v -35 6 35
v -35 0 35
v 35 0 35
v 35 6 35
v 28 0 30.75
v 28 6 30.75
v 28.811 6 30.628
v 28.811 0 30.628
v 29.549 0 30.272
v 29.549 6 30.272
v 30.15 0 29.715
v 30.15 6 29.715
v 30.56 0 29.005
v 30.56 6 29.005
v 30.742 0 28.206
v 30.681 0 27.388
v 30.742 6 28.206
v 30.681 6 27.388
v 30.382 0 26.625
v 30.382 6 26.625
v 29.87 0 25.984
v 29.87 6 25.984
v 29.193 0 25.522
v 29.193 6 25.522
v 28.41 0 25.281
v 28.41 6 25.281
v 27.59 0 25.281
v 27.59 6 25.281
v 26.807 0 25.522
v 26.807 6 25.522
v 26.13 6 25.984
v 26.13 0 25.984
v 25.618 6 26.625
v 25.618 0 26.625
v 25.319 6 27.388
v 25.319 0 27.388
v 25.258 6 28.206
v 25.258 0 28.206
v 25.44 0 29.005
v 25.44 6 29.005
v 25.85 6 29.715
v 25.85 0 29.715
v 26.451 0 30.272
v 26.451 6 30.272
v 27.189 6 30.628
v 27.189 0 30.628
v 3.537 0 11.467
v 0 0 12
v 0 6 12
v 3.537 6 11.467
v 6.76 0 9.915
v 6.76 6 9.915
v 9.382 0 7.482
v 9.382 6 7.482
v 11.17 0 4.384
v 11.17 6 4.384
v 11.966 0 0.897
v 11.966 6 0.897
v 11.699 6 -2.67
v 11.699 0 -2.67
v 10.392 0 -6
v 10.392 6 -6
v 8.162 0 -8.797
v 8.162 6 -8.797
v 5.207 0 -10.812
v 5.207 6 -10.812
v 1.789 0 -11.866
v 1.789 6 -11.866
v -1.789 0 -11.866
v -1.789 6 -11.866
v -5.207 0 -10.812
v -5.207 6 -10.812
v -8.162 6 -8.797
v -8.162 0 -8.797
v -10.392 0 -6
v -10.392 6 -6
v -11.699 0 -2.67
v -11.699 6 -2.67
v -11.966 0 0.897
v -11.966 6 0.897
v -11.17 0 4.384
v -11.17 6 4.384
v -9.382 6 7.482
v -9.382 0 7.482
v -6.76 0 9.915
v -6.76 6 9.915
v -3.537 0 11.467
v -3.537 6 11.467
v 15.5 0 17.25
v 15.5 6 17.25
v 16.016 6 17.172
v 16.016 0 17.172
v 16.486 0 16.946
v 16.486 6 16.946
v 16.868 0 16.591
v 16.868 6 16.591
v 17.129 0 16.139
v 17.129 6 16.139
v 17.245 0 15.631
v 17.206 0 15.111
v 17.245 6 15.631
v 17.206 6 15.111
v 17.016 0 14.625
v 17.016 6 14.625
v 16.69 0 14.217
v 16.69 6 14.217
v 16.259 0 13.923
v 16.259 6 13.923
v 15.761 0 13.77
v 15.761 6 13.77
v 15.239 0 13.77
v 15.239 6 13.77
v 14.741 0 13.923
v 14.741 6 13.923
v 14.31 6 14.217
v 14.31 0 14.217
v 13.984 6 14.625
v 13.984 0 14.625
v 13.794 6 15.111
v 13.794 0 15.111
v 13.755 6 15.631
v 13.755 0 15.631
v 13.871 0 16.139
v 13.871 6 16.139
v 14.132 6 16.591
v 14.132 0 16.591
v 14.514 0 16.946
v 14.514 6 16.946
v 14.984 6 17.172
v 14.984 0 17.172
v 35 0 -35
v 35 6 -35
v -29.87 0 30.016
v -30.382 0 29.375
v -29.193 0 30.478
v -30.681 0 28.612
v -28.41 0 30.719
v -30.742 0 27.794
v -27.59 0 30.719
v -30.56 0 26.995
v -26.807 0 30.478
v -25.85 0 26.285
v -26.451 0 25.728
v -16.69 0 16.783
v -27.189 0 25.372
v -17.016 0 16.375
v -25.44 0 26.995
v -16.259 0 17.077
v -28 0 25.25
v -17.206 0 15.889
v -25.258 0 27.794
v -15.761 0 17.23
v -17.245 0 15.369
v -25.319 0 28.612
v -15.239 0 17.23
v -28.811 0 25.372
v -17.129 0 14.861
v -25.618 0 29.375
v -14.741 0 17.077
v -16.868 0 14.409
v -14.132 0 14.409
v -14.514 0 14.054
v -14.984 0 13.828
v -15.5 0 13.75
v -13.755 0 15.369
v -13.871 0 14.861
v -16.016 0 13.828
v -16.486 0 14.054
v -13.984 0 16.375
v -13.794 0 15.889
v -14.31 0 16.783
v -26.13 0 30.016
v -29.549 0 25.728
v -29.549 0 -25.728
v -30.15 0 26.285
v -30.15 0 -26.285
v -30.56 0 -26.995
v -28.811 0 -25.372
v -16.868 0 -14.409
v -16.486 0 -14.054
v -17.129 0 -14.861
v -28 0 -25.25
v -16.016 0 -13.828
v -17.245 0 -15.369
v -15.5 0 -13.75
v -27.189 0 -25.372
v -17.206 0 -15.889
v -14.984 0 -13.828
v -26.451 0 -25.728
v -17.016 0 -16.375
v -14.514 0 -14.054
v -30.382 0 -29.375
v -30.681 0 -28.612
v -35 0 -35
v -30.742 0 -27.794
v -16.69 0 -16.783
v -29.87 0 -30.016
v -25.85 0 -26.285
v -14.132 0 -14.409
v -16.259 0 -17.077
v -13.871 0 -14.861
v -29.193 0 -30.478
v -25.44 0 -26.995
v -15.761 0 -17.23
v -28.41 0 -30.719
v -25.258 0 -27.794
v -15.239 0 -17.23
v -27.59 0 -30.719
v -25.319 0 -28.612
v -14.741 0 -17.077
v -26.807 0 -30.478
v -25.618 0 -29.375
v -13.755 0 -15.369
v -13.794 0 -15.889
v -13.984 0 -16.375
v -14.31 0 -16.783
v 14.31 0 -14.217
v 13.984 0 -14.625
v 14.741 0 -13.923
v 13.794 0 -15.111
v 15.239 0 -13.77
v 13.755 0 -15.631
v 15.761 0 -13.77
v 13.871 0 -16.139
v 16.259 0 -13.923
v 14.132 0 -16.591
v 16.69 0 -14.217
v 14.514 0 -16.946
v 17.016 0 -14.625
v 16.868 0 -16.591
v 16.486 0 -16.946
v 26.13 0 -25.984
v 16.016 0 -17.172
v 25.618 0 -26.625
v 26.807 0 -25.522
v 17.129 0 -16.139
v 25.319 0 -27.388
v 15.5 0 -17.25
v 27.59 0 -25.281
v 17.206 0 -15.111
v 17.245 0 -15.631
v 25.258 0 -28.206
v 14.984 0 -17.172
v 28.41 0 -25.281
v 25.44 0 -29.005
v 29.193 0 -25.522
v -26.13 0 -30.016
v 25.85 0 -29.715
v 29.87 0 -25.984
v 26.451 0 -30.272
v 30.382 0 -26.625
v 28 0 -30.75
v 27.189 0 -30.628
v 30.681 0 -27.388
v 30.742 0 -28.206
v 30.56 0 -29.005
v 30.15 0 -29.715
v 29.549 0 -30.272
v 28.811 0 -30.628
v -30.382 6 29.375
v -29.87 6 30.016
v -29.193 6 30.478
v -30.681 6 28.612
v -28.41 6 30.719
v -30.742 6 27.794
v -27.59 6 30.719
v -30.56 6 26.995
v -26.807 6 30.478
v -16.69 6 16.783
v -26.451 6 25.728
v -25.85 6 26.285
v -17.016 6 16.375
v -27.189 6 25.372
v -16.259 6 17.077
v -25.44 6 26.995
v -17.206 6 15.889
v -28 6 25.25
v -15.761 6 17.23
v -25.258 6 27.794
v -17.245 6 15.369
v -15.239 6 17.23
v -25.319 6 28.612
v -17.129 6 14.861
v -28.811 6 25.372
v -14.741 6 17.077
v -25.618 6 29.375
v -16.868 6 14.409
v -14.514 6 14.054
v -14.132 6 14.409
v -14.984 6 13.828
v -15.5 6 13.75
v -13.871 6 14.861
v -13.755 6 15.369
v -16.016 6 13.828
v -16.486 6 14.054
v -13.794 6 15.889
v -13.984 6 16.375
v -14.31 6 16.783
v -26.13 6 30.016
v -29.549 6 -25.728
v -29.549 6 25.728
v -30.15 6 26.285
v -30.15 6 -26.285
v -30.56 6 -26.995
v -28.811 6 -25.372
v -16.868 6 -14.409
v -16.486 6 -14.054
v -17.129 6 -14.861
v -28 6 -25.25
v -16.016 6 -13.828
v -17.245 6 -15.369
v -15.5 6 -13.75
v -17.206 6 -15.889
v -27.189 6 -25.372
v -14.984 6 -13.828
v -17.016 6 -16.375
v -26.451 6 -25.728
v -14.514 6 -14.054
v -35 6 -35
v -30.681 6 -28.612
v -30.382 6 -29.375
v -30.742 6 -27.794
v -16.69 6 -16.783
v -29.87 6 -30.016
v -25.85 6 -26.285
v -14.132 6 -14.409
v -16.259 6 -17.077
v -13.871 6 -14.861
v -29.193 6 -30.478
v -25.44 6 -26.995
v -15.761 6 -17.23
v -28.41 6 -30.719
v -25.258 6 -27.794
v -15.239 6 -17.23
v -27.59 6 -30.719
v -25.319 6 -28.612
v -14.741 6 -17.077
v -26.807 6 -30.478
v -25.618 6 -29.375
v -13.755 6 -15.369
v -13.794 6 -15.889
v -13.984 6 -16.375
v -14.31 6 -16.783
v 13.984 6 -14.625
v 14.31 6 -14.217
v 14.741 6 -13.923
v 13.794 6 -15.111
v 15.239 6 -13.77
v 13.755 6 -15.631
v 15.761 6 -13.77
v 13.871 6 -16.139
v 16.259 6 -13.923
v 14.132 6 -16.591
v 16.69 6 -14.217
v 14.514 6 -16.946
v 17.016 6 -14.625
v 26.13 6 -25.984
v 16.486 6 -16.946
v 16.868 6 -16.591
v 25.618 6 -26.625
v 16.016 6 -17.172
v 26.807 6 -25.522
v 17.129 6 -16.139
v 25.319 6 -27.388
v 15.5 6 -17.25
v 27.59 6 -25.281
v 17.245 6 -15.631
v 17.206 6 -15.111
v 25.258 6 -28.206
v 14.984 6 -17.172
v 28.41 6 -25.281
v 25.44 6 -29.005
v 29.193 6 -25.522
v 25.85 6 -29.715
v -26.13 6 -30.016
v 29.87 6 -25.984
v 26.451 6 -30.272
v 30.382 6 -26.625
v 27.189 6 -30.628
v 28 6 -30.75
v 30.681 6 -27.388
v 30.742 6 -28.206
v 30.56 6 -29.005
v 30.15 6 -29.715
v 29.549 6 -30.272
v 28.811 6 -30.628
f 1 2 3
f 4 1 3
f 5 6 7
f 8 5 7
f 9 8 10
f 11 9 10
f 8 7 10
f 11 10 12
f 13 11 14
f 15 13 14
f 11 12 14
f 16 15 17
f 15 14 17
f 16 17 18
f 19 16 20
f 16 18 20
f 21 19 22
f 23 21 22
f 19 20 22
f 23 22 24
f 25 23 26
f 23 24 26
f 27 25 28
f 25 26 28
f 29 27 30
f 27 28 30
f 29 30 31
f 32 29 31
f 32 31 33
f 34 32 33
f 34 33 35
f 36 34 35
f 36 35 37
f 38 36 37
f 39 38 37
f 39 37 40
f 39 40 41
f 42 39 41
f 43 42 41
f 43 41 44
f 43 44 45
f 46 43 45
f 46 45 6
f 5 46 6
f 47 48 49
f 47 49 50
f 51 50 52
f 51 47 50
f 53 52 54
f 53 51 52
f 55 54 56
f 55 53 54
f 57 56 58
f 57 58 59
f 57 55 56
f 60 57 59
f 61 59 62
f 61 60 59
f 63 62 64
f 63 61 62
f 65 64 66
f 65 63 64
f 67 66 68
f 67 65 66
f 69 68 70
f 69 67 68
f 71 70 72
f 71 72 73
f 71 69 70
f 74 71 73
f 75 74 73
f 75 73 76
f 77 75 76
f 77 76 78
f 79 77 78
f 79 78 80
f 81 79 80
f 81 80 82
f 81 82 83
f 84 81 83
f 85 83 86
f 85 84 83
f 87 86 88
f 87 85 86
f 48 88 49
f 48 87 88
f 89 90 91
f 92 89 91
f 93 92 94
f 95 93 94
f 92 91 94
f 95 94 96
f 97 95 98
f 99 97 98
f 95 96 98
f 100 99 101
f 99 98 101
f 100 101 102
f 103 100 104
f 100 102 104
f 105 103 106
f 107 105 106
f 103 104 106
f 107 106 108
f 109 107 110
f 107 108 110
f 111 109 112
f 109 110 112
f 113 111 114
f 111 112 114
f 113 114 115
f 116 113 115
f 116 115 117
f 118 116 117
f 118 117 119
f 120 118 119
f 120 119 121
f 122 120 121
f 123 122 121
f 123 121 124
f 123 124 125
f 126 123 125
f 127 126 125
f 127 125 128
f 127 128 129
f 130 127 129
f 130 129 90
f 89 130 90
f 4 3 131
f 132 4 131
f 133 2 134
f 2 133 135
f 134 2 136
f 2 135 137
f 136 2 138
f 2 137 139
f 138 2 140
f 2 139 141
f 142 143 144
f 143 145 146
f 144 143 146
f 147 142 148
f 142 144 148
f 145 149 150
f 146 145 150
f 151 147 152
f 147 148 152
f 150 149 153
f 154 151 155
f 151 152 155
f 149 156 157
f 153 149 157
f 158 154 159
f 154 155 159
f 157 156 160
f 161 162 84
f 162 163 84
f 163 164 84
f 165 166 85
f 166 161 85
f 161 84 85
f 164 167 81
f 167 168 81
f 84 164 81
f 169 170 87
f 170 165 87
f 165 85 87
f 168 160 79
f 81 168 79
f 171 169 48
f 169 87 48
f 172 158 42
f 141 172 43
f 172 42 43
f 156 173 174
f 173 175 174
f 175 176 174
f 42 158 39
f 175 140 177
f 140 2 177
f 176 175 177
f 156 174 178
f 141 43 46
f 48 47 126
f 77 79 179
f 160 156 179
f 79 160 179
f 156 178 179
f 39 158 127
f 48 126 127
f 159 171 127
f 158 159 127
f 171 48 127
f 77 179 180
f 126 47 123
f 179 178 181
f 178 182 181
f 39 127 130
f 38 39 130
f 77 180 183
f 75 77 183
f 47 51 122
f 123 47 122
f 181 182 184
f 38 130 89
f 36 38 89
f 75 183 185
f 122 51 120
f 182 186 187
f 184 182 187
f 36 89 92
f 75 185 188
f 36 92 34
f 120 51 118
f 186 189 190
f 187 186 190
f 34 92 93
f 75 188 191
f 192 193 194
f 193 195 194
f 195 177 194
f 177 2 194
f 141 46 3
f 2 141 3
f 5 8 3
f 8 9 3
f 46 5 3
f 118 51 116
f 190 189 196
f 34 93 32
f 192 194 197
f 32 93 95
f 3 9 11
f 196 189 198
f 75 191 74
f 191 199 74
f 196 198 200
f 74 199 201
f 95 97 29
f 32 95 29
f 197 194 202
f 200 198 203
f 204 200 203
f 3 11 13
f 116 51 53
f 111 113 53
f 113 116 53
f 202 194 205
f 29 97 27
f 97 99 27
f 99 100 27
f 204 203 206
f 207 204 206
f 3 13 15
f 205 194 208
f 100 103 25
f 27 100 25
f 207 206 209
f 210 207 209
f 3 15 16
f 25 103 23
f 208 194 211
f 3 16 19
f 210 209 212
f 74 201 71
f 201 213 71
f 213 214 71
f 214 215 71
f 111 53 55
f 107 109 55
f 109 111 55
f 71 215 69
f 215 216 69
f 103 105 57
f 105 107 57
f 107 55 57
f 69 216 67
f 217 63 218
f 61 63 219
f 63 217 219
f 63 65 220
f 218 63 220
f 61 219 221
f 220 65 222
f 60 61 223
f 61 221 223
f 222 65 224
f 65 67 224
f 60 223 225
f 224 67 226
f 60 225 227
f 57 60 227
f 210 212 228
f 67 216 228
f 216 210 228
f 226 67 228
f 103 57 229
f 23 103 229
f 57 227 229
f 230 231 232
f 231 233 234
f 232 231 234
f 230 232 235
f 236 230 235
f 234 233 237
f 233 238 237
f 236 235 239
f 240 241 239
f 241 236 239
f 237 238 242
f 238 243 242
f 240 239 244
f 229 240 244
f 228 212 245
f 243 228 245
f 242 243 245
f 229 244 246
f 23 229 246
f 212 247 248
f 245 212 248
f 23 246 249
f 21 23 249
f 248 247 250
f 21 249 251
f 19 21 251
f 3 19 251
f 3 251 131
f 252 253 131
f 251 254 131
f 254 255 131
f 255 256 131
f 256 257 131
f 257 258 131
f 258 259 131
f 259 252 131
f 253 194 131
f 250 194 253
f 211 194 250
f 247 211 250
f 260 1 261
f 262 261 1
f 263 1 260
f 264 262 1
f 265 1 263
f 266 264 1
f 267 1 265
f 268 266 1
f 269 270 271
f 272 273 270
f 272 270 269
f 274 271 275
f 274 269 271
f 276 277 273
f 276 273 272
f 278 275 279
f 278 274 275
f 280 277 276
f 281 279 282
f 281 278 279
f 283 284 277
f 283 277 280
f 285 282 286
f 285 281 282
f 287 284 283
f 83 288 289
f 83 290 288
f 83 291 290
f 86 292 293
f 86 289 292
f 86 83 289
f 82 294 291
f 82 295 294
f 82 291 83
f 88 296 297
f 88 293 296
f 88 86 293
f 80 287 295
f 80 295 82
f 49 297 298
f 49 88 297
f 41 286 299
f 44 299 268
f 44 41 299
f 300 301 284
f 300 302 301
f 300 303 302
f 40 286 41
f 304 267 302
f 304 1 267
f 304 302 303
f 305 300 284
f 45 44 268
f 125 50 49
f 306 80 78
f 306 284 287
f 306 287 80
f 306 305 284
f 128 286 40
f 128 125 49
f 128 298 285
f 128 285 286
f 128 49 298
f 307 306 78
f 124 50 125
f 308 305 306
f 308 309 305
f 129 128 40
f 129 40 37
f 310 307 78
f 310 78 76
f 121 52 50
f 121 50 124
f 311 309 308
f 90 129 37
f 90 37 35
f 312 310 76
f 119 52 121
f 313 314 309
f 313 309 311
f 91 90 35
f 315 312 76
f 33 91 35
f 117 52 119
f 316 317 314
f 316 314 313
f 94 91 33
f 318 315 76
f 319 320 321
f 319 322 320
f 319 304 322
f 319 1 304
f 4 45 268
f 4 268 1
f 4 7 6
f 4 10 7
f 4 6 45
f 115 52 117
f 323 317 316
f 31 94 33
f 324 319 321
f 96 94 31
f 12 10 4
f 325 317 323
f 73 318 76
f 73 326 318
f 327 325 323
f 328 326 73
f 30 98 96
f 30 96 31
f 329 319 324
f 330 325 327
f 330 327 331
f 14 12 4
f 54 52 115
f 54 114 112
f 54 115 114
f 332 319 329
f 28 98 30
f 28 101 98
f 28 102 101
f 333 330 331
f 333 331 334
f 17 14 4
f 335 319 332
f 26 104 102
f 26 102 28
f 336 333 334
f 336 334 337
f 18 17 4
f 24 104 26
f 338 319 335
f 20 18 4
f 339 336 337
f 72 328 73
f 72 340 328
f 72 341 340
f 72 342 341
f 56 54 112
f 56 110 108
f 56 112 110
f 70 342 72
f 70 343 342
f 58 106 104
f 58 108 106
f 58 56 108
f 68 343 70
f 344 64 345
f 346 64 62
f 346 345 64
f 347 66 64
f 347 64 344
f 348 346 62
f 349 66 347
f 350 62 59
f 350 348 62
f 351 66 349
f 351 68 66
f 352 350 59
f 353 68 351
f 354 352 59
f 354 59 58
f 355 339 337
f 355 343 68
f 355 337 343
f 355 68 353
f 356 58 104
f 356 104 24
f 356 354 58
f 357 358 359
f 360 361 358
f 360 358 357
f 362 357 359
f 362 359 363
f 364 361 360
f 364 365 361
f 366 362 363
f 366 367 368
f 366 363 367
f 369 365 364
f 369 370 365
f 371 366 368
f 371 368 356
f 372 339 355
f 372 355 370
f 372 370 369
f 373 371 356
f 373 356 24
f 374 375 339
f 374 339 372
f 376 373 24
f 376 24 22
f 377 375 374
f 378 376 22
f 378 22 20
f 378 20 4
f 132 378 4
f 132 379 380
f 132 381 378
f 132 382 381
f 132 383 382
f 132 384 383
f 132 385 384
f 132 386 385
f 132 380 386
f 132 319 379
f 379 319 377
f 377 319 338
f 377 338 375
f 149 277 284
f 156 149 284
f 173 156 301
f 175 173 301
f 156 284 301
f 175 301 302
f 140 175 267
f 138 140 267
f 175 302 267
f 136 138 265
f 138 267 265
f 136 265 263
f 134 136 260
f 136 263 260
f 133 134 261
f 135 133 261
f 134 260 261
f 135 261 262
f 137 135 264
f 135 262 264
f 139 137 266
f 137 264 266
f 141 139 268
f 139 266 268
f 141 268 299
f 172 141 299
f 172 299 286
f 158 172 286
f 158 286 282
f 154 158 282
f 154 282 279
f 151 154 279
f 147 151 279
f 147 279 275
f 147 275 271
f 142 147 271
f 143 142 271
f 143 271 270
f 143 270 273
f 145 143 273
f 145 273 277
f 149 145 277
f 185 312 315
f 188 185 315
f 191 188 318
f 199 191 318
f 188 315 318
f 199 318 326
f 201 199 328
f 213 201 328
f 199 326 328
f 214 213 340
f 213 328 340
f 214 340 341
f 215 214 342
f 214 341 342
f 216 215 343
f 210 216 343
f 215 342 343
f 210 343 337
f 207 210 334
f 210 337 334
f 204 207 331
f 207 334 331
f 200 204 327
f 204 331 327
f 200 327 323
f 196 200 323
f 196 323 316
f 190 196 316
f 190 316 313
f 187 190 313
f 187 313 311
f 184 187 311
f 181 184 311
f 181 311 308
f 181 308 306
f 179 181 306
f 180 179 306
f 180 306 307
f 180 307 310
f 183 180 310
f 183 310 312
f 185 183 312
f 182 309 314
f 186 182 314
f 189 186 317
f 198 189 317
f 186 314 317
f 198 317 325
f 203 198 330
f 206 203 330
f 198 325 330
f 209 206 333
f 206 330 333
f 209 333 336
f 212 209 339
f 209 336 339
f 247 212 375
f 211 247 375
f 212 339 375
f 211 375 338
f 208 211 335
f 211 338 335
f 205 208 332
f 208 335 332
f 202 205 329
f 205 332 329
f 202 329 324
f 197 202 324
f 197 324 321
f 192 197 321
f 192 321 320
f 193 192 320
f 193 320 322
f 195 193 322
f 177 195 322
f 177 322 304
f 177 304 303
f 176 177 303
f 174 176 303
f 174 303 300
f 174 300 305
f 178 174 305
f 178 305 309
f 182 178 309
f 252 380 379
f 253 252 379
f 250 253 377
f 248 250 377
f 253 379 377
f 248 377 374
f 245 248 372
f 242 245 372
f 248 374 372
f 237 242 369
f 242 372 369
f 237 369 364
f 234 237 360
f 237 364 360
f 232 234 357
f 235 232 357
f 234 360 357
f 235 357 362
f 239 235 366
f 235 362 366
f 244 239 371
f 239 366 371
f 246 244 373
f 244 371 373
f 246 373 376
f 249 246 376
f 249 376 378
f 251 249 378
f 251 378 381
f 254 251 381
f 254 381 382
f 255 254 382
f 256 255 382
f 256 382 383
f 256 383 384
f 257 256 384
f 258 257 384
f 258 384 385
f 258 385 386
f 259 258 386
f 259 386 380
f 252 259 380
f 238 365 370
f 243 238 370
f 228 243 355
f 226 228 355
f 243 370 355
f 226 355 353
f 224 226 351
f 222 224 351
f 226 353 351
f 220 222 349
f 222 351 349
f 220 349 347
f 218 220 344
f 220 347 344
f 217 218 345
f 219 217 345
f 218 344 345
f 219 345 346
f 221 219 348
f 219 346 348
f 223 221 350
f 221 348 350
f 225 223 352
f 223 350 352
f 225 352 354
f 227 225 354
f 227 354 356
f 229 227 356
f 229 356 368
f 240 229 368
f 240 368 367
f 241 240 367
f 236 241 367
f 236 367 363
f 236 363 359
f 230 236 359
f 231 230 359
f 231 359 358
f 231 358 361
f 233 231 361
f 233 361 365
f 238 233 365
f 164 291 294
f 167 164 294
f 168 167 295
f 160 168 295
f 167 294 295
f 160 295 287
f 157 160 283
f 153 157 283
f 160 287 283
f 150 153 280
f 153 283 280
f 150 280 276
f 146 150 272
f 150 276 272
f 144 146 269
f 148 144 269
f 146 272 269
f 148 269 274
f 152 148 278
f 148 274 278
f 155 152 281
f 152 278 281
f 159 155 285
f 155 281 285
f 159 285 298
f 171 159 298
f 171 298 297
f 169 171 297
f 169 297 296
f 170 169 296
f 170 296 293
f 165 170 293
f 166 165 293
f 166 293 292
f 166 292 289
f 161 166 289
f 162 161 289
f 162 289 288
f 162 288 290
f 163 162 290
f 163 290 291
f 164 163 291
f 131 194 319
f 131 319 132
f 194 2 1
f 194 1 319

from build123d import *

# Parameters (mm, degrees)
SKETCH4_W           = 70
SKETCH4_H           = 70
SKETCH4_R           = 12
BOSS_EXTRUDE2_DEPTH = 6
SKETCH5_R           = 1.75
CUT_EXTRUDE1_DEPTH  = 50.859803449
SKETCH6_R           = 2.75
CUT_EXTRUDE2_DEPTH  = 50.859803449


with BuildPart() as part:
    # Sketch4 → Boss-Extrude2 (new body)
    with BuildSketch(Plane(origin=(0, 0, 0), x_dir=(1, 0, 0), z_dir=(0, 1, 0))):
        Rectangle(SKETCH4_W, SKETCH4_H)
        with Locations(Location((0, 0, 0), (0, 0, 270))):
            Circle(SKETCH4_R, mode=Mode.SUBTRACT)
    extrude(amount=BOSS_EXTRUDE2_DEPTH)

    # Sketch5 → Cut-Extrude1 (cut, through all)
    with BuildSketch(Plane(origin=(0, 6, 0), x_dir=(1, 0, 0), z_dir=(0, 1, 0))):
        with Locations(Location((-15.5, 15.5, 0), (0, 0, 270))):
            Circle(SKETCH5_R)
        with Locations(Location((15.5, 15.5, 0), (0, 0, 90))):
            Circle(SKETCH5_R)
        with Locations(Location((15.5, -15.5, 0), (0, 0, 270))):
            Circle(SKETCH5_R)
        with Locations(Location((-15.5, -15.5, 0), (0, 0, 90))):
            Circle(SKETCH5_R)
    extrude(amount=-CUT_EXTRUDE1_DEPTH, mode=Mode.SUBTRACT)

    # Sketch6 → Cut-Extrude2 (cut, through all)
    with BuildSketch(Plane(origin=(0, 6, 0), x_dir=(1, 0, 0), z_dir=(0, 1, 0))):
        with Locations(Location((-28, 28, 0), (0, 0, 270))):
            Circle(SKETCH6_R)
        with Locations(Location((28, 28, 0), (0, 0, 90))):
            Circle(SKETCH6_R)
        with Locations(Location((28, -28, 0), (0, 0, 270))):
            Circle(SKETCH6_R)
        with Locations(Location((-28, -28, 0), (0, 0, 90))):
            Circle(SKETCH6_R)
    extrude(amount=-CUT_EXTRUDE2_DEPTH, mode=Mode.SUBTRACT)


solid = part.part
